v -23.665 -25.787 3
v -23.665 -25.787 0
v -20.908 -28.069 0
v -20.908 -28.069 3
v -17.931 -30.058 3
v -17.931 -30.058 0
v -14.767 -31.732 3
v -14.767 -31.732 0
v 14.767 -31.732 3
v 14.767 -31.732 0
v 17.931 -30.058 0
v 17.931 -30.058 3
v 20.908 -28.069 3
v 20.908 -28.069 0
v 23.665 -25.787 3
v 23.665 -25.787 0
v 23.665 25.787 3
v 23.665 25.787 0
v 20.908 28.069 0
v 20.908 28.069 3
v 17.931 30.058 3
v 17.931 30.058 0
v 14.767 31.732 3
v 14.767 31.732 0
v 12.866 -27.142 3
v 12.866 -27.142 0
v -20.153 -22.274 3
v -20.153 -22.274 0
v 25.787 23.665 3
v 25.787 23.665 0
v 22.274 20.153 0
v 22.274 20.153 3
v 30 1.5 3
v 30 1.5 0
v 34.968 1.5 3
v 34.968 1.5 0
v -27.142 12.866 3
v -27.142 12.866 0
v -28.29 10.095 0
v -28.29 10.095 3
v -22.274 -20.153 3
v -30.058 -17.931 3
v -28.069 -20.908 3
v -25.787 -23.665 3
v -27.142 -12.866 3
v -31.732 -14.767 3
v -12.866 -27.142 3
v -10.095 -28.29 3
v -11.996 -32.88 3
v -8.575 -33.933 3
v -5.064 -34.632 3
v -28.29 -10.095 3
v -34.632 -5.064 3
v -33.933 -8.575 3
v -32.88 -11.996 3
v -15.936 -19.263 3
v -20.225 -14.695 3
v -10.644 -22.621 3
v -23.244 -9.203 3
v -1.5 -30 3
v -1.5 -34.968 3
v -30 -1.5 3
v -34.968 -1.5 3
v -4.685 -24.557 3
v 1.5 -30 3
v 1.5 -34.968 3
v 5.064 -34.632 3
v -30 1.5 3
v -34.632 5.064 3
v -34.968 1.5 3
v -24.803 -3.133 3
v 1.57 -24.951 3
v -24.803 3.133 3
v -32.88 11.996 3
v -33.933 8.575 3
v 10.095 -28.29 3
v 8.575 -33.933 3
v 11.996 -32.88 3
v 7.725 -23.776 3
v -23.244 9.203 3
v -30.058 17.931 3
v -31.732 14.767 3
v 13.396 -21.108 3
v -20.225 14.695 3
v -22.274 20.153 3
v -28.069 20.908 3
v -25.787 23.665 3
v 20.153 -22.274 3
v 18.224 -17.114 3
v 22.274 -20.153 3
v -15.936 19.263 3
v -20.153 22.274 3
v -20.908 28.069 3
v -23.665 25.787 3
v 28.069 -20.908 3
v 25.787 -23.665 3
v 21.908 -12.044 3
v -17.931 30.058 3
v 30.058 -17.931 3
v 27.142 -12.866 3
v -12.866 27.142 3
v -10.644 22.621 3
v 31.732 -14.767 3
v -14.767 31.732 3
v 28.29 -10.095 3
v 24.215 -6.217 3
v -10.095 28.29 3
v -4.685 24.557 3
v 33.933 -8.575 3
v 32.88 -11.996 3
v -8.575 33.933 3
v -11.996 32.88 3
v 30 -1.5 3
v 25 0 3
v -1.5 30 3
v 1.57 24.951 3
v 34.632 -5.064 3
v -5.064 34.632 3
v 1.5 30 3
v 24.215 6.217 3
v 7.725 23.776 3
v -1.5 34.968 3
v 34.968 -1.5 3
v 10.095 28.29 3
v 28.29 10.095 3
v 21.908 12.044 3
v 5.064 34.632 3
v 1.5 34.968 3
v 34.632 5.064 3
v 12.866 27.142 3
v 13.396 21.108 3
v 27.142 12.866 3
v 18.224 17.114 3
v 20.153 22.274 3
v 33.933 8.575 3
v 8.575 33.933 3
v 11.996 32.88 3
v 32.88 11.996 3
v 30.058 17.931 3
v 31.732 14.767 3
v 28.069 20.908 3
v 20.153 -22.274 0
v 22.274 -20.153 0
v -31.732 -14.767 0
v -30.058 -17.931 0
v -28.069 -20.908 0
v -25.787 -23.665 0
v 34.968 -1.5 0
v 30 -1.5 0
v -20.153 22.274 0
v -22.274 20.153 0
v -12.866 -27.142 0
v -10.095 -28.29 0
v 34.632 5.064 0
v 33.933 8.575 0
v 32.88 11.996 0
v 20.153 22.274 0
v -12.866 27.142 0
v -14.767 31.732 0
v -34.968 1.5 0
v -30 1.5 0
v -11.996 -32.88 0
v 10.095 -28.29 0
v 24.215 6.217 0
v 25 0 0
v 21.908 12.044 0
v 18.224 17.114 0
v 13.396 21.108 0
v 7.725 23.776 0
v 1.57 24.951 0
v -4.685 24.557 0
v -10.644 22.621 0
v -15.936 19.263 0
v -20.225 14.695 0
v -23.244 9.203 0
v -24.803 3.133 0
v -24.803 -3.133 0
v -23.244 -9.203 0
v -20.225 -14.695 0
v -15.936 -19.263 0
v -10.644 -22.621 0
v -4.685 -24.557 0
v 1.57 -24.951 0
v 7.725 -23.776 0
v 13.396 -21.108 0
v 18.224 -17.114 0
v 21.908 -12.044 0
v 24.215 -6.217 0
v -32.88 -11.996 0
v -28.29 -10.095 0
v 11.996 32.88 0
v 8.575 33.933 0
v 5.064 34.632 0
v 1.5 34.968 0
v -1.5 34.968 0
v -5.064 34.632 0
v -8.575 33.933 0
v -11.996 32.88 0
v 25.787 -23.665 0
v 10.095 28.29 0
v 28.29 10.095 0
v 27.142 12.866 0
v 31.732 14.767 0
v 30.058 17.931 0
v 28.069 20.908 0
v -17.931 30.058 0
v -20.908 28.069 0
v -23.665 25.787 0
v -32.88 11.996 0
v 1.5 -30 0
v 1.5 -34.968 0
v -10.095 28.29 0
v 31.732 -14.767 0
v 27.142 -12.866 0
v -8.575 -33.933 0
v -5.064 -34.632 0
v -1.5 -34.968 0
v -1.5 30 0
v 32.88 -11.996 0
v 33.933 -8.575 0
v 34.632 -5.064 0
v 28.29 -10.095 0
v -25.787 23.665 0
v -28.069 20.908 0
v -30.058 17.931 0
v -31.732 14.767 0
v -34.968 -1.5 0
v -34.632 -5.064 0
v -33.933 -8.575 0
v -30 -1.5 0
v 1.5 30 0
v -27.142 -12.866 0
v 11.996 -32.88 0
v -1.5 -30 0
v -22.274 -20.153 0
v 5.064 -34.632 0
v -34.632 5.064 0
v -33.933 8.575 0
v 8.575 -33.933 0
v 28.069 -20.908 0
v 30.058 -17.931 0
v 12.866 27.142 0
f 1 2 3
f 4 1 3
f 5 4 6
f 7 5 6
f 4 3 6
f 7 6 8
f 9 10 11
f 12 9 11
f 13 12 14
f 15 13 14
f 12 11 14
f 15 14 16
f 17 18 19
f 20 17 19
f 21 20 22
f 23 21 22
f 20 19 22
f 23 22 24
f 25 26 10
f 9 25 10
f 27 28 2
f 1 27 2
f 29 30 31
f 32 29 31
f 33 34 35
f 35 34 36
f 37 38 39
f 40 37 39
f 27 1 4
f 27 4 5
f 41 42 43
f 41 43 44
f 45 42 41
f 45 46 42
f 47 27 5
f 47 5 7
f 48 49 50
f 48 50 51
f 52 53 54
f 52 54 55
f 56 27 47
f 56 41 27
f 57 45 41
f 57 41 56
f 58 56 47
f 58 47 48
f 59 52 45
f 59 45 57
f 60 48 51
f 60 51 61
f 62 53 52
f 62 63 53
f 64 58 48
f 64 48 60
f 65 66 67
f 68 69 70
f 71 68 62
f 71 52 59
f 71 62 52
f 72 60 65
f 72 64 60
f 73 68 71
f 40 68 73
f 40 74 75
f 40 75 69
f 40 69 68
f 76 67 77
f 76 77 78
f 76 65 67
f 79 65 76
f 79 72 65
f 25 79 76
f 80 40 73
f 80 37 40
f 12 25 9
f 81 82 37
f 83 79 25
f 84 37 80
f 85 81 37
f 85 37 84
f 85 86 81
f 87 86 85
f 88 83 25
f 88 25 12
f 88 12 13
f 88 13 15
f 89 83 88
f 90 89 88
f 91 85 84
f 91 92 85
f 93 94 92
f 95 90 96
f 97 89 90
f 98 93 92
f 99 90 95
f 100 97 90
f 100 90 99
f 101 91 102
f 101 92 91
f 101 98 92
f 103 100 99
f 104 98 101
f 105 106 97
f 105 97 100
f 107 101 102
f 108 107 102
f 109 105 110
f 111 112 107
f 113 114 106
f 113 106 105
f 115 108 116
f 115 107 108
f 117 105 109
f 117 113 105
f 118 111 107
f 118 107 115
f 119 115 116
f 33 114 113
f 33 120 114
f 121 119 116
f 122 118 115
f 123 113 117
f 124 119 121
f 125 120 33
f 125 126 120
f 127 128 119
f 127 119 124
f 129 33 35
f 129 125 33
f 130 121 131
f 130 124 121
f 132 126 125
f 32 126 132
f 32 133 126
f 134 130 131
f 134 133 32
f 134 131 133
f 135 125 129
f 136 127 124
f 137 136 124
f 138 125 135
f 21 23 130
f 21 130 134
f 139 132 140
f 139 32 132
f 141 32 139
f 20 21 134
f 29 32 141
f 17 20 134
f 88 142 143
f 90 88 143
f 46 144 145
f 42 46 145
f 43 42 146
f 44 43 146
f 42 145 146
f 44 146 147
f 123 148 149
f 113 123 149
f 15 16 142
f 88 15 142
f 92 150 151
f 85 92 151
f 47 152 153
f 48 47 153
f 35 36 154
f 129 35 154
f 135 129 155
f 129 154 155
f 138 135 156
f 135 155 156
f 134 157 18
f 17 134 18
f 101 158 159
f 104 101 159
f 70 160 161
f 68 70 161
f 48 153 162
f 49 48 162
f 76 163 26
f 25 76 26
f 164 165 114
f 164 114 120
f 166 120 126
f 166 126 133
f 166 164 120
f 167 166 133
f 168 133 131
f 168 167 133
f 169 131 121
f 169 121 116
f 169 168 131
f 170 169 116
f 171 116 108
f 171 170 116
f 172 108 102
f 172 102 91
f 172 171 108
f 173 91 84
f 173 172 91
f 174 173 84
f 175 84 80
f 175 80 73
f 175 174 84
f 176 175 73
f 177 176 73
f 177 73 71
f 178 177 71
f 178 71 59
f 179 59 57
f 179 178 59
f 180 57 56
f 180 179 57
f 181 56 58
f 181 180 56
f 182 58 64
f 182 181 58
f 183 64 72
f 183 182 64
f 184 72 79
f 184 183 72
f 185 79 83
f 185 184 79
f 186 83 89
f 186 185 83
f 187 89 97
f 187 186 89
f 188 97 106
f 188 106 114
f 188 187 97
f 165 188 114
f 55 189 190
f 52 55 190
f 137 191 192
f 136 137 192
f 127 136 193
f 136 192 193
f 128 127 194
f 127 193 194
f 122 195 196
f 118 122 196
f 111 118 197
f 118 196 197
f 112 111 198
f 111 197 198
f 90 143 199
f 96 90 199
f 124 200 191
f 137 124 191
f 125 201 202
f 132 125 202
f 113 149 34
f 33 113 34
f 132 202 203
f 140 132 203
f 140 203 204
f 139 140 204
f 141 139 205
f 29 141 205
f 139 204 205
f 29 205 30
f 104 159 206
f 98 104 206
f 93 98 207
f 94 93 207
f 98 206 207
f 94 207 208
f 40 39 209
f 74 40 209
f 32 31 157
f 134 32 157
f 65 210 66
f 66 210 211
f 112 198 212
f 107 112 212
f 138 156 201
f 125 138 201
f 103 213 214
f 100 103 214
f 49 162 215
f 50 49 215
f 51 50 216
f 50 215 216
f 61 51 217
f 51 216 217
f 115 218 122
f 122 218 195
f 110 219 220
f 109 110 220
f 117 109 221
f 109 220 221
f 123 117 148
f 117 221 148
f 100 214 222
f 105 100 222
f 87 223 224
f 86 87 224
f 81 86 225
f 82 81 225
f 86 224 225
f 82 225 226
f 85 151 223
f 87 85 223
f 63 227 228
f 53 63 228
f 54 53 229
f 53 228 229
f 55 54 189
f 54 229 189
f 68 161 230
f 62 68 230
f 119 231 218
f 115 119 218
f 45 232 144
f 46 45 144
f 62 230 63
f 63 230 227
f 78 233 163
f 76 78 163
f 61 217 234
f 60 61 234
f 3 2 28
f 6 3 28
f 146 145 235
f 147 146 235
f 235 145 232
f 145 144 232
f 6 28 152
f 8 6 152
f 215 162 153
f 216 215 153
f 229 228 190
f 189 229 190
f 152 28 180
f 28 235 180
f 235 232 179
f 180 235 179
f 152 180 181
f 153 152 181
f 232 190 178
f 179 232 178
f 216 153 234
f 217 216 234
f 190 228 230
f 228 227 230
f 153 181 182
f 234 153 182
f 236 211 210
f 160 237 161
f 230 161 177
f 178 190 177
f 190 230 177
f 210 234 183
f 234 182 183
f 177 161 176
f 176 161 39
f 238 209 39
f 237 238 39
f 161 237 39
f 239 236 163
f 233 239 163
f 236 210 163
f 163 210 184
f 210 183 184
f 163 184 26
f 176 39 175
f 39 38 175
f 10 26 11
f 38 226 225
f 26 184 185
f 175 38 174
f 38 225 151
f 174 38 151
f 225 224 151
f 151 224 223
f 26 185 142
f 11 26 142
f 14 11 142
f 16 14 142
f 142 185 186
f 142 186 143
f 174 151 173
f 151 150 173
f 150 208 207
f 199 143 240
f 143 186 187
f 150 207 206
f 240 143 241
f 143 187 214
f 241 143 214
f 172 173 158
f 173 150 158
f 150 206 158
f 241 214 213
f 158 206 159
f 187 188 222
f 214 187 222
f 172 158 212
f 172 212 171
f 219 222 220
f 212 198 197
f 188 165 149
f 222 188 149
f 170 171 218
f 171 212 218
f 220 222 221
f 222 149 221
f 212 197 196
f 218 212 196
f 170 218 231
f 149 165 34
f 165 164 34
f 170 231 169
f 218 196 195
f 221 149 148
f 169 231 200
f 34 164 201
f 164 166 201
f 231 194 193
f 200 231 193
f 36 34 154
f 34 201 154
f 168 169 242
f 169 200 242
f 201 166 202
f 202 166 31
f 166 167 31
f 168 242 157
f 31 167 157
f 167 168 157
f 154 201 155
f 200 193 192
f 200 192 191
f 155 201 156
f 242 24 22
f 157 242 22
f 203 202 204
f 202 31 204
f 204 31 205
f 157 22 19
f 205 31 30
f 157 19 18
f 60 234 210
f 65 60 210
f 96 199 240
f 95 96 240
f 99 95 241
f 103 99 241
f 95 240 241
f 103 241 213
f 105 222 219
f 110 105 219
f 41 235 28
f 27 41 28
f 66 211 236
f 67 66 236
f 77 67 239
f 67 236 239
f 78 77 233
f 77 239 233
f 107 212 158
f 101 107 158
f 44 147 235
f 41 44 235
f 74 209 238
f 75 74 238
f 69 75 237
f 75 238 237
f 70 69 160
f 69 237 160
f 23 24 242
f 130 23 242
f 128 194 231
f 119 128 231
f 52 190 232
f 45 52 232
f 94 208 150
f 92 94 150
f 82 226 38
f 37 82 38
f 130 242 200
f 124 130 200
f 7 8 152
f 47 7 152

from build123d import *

# Parameters (mm, degrees)
F0_R     = 25
F1_DEPTH = 3


with BuildPart() as f1:
    # F0 (on Top) → F1 (new body)
    with BuildSketch(Plane.XY):
        with BuildLine():
            Line((30, 1.5), (34.967842, 1.5))
            ThreePointArc((34.967842, 1.5), (34.327485, 6.828161), (32.880099, 11.995795))
            Line((32.880099, 11.995795), (28.290411, 10.094684))
            Line((28.290411, 10.094684), (27.142361, 12.866322))
            Line((27.142361, 12.866322), (31.732049, 14.767433))
            ThreePointArc((31.732049, 14.767433), (29.101436, 19.444958), (25.786659, 23.665338))
            Line((25.786659, 23.665338), (22.273864, 20.152543))
            Line((22.273864, 20.152543), (20.152543, 22.273864))
            Line((20.152543, 22.273864), (23.665338, 25.786659))
            ThreePointArc((23.665338, 25.786659), (19.444958, 29.101436), (14.767433, 31.732049))
            Line((14.767433, 31.732049), (12.866322, 27.142361))
            Line((12.866322, 27.142361), (10.094684, 28.290411))
            Line((10.094684, 28.290411), (11.995795, 32.880099))
            ThreePointArc((11.995795, 32.880099), (6.828161, 34.327485), (1.5, 34.967842))
            Line((1.5, 34.967842), (1.5, 30))
            Line((1.5, 30), (-1.5, 30))
            Line((-1.5, 30), (-1.5, 34.967842))
            ThreePointArc((-1.5, 34.967842), (-6.828161, 34.327485), (-11.995795, 32.880099))
            Line((-11.995795, 32.880099), (-10.094684, 28.290411))
            Line((-10.094684, 28.290411), (-12.866322, 27.142361))
            Line((-12.866322, 27.142361), (-14.767433, 31.732049))
            ThreePointArc((-14.767433, 31.732049), (-19.444958, 29.101436), (-23.665338, 25.786659))
            Line((-23.665338, 25.786659), (-20.152543, 22.273864))
            Line((-20.152543, 22.273864), (-22.273864, 20.152543))
            Line((-22.273864, 20.152543), (-25.786659, 23.665338))
            ThreePointArc((-25.786659, 23.665338), (-29.101436, 19.444958), (-31.732049, 14.767433))
            Line((-31.732049, 14.767433), (-27.142361, 12.866322))
            Line((-27.142361, 12.866322), (-28.290411, 10.094684))
            Line((-28.290411, 10.094684), (-32.880099, 11.995795))
            ThreePointArc((-32.880099, 11.995795), (-34.327485, 6.828161), (-34.967842, 1.5))
            Line((-34.967842, 1.5), (-30, 1.5))
            Line((-30, 1.5), (-30, -1.5))
            Line((-30, -1.5), (-34.967842, -1.5))
            ThreePointArc((-34.967842, -1.5), (-34.327485, -6.828161), (-32.880099, -11.995795))
            Line((-32.880099, -11.995795), (-28.290411, -10.094684))
            Line((-28.290411, -10.094684), (-27.142361, -12.866322))
            Line((-27.142361, -12.866322), (-31.732049, -14.767433))
            ThreePointArc((-31.732049, -14.767433), (-29.101436, -19.444958), (-25.786659, -23.665338))
            Line((-25.786659, -23.665338), (-22.273864, -20.152543))
            Line((-22.273864, -20.152543), (-20.152543, -22.273864))
            Line((-20.152543, -22.273864), (-23.665338, -25.786659))
            ThreePointArc((-23.665338, -25.786659), (-19.444958, -29.101436), (-14.767433, -31.732049))
            Line((-14.767433, -31.732049), (-12.866322, -27.142361))
            Line((-12.866322, -27.142361), (-10.094684, -28.290411))
            Line((-10.094684, -28.290411), (-11.995795, -32.880099))
            ThreePointArc((-11.995795, -32.880099), (-6.828161, -34.327485), (-1.5, -34.967842))
            Line((-1.5, -34.967842), (-1.5, -30))
            Line((-1.5, -30), (0, -30))
            Line((0, -30), (1.5, -30))
            Line((1.5, -30), (1.5, -34.967842))
            ThreePointArc((1.5, -34.967842), (6.828161, -34.327485), (11.995795, -32.880099))
            Line((11.995795, -32.880099), (10.094684, -28.290411))
            Line((10.094684, -28.290411), (12.866322, -27.142361))
            Line((12.866322, -27.142361), (14.767433, -31.732049))
            ThreePointArc((14.767433, -31.732049), (19.444958, -29.101436), (23.665338, -25.786659))
            Line((23.665338, -25.786659), (20.152543, -22.273864))
            Line((20.152543, -22.273864), (22.273864, -20.152543))
            Line((22.273864, -20.152543), (25.786659, -23.665338))
            ThreePointArc((25.786659, -23.665338), (29.101436, -19.444958), (31.732049, -14.767433))
            Line((31.732049, -14.767433), (27.142361, -12.866322))
            Line((27.142361, -12.866322), (28.290411, -10.094684))
            Line((28.290411, -10.094684), (32.880099, -11.995795))
            ThreePointArc((32.880099, -11.995795), (34.327485, -6.828161), (34.967842, -1.5))
            Line((34.967842, -1.5), (30, -1.5))
            Line((30, -1.5), (30, 1.5))
        make_face()
        Circle(F0_R, mode=Mode.SUBTRACT)
    extrude(amount=F1_DEPTH)


solid = f1.part
